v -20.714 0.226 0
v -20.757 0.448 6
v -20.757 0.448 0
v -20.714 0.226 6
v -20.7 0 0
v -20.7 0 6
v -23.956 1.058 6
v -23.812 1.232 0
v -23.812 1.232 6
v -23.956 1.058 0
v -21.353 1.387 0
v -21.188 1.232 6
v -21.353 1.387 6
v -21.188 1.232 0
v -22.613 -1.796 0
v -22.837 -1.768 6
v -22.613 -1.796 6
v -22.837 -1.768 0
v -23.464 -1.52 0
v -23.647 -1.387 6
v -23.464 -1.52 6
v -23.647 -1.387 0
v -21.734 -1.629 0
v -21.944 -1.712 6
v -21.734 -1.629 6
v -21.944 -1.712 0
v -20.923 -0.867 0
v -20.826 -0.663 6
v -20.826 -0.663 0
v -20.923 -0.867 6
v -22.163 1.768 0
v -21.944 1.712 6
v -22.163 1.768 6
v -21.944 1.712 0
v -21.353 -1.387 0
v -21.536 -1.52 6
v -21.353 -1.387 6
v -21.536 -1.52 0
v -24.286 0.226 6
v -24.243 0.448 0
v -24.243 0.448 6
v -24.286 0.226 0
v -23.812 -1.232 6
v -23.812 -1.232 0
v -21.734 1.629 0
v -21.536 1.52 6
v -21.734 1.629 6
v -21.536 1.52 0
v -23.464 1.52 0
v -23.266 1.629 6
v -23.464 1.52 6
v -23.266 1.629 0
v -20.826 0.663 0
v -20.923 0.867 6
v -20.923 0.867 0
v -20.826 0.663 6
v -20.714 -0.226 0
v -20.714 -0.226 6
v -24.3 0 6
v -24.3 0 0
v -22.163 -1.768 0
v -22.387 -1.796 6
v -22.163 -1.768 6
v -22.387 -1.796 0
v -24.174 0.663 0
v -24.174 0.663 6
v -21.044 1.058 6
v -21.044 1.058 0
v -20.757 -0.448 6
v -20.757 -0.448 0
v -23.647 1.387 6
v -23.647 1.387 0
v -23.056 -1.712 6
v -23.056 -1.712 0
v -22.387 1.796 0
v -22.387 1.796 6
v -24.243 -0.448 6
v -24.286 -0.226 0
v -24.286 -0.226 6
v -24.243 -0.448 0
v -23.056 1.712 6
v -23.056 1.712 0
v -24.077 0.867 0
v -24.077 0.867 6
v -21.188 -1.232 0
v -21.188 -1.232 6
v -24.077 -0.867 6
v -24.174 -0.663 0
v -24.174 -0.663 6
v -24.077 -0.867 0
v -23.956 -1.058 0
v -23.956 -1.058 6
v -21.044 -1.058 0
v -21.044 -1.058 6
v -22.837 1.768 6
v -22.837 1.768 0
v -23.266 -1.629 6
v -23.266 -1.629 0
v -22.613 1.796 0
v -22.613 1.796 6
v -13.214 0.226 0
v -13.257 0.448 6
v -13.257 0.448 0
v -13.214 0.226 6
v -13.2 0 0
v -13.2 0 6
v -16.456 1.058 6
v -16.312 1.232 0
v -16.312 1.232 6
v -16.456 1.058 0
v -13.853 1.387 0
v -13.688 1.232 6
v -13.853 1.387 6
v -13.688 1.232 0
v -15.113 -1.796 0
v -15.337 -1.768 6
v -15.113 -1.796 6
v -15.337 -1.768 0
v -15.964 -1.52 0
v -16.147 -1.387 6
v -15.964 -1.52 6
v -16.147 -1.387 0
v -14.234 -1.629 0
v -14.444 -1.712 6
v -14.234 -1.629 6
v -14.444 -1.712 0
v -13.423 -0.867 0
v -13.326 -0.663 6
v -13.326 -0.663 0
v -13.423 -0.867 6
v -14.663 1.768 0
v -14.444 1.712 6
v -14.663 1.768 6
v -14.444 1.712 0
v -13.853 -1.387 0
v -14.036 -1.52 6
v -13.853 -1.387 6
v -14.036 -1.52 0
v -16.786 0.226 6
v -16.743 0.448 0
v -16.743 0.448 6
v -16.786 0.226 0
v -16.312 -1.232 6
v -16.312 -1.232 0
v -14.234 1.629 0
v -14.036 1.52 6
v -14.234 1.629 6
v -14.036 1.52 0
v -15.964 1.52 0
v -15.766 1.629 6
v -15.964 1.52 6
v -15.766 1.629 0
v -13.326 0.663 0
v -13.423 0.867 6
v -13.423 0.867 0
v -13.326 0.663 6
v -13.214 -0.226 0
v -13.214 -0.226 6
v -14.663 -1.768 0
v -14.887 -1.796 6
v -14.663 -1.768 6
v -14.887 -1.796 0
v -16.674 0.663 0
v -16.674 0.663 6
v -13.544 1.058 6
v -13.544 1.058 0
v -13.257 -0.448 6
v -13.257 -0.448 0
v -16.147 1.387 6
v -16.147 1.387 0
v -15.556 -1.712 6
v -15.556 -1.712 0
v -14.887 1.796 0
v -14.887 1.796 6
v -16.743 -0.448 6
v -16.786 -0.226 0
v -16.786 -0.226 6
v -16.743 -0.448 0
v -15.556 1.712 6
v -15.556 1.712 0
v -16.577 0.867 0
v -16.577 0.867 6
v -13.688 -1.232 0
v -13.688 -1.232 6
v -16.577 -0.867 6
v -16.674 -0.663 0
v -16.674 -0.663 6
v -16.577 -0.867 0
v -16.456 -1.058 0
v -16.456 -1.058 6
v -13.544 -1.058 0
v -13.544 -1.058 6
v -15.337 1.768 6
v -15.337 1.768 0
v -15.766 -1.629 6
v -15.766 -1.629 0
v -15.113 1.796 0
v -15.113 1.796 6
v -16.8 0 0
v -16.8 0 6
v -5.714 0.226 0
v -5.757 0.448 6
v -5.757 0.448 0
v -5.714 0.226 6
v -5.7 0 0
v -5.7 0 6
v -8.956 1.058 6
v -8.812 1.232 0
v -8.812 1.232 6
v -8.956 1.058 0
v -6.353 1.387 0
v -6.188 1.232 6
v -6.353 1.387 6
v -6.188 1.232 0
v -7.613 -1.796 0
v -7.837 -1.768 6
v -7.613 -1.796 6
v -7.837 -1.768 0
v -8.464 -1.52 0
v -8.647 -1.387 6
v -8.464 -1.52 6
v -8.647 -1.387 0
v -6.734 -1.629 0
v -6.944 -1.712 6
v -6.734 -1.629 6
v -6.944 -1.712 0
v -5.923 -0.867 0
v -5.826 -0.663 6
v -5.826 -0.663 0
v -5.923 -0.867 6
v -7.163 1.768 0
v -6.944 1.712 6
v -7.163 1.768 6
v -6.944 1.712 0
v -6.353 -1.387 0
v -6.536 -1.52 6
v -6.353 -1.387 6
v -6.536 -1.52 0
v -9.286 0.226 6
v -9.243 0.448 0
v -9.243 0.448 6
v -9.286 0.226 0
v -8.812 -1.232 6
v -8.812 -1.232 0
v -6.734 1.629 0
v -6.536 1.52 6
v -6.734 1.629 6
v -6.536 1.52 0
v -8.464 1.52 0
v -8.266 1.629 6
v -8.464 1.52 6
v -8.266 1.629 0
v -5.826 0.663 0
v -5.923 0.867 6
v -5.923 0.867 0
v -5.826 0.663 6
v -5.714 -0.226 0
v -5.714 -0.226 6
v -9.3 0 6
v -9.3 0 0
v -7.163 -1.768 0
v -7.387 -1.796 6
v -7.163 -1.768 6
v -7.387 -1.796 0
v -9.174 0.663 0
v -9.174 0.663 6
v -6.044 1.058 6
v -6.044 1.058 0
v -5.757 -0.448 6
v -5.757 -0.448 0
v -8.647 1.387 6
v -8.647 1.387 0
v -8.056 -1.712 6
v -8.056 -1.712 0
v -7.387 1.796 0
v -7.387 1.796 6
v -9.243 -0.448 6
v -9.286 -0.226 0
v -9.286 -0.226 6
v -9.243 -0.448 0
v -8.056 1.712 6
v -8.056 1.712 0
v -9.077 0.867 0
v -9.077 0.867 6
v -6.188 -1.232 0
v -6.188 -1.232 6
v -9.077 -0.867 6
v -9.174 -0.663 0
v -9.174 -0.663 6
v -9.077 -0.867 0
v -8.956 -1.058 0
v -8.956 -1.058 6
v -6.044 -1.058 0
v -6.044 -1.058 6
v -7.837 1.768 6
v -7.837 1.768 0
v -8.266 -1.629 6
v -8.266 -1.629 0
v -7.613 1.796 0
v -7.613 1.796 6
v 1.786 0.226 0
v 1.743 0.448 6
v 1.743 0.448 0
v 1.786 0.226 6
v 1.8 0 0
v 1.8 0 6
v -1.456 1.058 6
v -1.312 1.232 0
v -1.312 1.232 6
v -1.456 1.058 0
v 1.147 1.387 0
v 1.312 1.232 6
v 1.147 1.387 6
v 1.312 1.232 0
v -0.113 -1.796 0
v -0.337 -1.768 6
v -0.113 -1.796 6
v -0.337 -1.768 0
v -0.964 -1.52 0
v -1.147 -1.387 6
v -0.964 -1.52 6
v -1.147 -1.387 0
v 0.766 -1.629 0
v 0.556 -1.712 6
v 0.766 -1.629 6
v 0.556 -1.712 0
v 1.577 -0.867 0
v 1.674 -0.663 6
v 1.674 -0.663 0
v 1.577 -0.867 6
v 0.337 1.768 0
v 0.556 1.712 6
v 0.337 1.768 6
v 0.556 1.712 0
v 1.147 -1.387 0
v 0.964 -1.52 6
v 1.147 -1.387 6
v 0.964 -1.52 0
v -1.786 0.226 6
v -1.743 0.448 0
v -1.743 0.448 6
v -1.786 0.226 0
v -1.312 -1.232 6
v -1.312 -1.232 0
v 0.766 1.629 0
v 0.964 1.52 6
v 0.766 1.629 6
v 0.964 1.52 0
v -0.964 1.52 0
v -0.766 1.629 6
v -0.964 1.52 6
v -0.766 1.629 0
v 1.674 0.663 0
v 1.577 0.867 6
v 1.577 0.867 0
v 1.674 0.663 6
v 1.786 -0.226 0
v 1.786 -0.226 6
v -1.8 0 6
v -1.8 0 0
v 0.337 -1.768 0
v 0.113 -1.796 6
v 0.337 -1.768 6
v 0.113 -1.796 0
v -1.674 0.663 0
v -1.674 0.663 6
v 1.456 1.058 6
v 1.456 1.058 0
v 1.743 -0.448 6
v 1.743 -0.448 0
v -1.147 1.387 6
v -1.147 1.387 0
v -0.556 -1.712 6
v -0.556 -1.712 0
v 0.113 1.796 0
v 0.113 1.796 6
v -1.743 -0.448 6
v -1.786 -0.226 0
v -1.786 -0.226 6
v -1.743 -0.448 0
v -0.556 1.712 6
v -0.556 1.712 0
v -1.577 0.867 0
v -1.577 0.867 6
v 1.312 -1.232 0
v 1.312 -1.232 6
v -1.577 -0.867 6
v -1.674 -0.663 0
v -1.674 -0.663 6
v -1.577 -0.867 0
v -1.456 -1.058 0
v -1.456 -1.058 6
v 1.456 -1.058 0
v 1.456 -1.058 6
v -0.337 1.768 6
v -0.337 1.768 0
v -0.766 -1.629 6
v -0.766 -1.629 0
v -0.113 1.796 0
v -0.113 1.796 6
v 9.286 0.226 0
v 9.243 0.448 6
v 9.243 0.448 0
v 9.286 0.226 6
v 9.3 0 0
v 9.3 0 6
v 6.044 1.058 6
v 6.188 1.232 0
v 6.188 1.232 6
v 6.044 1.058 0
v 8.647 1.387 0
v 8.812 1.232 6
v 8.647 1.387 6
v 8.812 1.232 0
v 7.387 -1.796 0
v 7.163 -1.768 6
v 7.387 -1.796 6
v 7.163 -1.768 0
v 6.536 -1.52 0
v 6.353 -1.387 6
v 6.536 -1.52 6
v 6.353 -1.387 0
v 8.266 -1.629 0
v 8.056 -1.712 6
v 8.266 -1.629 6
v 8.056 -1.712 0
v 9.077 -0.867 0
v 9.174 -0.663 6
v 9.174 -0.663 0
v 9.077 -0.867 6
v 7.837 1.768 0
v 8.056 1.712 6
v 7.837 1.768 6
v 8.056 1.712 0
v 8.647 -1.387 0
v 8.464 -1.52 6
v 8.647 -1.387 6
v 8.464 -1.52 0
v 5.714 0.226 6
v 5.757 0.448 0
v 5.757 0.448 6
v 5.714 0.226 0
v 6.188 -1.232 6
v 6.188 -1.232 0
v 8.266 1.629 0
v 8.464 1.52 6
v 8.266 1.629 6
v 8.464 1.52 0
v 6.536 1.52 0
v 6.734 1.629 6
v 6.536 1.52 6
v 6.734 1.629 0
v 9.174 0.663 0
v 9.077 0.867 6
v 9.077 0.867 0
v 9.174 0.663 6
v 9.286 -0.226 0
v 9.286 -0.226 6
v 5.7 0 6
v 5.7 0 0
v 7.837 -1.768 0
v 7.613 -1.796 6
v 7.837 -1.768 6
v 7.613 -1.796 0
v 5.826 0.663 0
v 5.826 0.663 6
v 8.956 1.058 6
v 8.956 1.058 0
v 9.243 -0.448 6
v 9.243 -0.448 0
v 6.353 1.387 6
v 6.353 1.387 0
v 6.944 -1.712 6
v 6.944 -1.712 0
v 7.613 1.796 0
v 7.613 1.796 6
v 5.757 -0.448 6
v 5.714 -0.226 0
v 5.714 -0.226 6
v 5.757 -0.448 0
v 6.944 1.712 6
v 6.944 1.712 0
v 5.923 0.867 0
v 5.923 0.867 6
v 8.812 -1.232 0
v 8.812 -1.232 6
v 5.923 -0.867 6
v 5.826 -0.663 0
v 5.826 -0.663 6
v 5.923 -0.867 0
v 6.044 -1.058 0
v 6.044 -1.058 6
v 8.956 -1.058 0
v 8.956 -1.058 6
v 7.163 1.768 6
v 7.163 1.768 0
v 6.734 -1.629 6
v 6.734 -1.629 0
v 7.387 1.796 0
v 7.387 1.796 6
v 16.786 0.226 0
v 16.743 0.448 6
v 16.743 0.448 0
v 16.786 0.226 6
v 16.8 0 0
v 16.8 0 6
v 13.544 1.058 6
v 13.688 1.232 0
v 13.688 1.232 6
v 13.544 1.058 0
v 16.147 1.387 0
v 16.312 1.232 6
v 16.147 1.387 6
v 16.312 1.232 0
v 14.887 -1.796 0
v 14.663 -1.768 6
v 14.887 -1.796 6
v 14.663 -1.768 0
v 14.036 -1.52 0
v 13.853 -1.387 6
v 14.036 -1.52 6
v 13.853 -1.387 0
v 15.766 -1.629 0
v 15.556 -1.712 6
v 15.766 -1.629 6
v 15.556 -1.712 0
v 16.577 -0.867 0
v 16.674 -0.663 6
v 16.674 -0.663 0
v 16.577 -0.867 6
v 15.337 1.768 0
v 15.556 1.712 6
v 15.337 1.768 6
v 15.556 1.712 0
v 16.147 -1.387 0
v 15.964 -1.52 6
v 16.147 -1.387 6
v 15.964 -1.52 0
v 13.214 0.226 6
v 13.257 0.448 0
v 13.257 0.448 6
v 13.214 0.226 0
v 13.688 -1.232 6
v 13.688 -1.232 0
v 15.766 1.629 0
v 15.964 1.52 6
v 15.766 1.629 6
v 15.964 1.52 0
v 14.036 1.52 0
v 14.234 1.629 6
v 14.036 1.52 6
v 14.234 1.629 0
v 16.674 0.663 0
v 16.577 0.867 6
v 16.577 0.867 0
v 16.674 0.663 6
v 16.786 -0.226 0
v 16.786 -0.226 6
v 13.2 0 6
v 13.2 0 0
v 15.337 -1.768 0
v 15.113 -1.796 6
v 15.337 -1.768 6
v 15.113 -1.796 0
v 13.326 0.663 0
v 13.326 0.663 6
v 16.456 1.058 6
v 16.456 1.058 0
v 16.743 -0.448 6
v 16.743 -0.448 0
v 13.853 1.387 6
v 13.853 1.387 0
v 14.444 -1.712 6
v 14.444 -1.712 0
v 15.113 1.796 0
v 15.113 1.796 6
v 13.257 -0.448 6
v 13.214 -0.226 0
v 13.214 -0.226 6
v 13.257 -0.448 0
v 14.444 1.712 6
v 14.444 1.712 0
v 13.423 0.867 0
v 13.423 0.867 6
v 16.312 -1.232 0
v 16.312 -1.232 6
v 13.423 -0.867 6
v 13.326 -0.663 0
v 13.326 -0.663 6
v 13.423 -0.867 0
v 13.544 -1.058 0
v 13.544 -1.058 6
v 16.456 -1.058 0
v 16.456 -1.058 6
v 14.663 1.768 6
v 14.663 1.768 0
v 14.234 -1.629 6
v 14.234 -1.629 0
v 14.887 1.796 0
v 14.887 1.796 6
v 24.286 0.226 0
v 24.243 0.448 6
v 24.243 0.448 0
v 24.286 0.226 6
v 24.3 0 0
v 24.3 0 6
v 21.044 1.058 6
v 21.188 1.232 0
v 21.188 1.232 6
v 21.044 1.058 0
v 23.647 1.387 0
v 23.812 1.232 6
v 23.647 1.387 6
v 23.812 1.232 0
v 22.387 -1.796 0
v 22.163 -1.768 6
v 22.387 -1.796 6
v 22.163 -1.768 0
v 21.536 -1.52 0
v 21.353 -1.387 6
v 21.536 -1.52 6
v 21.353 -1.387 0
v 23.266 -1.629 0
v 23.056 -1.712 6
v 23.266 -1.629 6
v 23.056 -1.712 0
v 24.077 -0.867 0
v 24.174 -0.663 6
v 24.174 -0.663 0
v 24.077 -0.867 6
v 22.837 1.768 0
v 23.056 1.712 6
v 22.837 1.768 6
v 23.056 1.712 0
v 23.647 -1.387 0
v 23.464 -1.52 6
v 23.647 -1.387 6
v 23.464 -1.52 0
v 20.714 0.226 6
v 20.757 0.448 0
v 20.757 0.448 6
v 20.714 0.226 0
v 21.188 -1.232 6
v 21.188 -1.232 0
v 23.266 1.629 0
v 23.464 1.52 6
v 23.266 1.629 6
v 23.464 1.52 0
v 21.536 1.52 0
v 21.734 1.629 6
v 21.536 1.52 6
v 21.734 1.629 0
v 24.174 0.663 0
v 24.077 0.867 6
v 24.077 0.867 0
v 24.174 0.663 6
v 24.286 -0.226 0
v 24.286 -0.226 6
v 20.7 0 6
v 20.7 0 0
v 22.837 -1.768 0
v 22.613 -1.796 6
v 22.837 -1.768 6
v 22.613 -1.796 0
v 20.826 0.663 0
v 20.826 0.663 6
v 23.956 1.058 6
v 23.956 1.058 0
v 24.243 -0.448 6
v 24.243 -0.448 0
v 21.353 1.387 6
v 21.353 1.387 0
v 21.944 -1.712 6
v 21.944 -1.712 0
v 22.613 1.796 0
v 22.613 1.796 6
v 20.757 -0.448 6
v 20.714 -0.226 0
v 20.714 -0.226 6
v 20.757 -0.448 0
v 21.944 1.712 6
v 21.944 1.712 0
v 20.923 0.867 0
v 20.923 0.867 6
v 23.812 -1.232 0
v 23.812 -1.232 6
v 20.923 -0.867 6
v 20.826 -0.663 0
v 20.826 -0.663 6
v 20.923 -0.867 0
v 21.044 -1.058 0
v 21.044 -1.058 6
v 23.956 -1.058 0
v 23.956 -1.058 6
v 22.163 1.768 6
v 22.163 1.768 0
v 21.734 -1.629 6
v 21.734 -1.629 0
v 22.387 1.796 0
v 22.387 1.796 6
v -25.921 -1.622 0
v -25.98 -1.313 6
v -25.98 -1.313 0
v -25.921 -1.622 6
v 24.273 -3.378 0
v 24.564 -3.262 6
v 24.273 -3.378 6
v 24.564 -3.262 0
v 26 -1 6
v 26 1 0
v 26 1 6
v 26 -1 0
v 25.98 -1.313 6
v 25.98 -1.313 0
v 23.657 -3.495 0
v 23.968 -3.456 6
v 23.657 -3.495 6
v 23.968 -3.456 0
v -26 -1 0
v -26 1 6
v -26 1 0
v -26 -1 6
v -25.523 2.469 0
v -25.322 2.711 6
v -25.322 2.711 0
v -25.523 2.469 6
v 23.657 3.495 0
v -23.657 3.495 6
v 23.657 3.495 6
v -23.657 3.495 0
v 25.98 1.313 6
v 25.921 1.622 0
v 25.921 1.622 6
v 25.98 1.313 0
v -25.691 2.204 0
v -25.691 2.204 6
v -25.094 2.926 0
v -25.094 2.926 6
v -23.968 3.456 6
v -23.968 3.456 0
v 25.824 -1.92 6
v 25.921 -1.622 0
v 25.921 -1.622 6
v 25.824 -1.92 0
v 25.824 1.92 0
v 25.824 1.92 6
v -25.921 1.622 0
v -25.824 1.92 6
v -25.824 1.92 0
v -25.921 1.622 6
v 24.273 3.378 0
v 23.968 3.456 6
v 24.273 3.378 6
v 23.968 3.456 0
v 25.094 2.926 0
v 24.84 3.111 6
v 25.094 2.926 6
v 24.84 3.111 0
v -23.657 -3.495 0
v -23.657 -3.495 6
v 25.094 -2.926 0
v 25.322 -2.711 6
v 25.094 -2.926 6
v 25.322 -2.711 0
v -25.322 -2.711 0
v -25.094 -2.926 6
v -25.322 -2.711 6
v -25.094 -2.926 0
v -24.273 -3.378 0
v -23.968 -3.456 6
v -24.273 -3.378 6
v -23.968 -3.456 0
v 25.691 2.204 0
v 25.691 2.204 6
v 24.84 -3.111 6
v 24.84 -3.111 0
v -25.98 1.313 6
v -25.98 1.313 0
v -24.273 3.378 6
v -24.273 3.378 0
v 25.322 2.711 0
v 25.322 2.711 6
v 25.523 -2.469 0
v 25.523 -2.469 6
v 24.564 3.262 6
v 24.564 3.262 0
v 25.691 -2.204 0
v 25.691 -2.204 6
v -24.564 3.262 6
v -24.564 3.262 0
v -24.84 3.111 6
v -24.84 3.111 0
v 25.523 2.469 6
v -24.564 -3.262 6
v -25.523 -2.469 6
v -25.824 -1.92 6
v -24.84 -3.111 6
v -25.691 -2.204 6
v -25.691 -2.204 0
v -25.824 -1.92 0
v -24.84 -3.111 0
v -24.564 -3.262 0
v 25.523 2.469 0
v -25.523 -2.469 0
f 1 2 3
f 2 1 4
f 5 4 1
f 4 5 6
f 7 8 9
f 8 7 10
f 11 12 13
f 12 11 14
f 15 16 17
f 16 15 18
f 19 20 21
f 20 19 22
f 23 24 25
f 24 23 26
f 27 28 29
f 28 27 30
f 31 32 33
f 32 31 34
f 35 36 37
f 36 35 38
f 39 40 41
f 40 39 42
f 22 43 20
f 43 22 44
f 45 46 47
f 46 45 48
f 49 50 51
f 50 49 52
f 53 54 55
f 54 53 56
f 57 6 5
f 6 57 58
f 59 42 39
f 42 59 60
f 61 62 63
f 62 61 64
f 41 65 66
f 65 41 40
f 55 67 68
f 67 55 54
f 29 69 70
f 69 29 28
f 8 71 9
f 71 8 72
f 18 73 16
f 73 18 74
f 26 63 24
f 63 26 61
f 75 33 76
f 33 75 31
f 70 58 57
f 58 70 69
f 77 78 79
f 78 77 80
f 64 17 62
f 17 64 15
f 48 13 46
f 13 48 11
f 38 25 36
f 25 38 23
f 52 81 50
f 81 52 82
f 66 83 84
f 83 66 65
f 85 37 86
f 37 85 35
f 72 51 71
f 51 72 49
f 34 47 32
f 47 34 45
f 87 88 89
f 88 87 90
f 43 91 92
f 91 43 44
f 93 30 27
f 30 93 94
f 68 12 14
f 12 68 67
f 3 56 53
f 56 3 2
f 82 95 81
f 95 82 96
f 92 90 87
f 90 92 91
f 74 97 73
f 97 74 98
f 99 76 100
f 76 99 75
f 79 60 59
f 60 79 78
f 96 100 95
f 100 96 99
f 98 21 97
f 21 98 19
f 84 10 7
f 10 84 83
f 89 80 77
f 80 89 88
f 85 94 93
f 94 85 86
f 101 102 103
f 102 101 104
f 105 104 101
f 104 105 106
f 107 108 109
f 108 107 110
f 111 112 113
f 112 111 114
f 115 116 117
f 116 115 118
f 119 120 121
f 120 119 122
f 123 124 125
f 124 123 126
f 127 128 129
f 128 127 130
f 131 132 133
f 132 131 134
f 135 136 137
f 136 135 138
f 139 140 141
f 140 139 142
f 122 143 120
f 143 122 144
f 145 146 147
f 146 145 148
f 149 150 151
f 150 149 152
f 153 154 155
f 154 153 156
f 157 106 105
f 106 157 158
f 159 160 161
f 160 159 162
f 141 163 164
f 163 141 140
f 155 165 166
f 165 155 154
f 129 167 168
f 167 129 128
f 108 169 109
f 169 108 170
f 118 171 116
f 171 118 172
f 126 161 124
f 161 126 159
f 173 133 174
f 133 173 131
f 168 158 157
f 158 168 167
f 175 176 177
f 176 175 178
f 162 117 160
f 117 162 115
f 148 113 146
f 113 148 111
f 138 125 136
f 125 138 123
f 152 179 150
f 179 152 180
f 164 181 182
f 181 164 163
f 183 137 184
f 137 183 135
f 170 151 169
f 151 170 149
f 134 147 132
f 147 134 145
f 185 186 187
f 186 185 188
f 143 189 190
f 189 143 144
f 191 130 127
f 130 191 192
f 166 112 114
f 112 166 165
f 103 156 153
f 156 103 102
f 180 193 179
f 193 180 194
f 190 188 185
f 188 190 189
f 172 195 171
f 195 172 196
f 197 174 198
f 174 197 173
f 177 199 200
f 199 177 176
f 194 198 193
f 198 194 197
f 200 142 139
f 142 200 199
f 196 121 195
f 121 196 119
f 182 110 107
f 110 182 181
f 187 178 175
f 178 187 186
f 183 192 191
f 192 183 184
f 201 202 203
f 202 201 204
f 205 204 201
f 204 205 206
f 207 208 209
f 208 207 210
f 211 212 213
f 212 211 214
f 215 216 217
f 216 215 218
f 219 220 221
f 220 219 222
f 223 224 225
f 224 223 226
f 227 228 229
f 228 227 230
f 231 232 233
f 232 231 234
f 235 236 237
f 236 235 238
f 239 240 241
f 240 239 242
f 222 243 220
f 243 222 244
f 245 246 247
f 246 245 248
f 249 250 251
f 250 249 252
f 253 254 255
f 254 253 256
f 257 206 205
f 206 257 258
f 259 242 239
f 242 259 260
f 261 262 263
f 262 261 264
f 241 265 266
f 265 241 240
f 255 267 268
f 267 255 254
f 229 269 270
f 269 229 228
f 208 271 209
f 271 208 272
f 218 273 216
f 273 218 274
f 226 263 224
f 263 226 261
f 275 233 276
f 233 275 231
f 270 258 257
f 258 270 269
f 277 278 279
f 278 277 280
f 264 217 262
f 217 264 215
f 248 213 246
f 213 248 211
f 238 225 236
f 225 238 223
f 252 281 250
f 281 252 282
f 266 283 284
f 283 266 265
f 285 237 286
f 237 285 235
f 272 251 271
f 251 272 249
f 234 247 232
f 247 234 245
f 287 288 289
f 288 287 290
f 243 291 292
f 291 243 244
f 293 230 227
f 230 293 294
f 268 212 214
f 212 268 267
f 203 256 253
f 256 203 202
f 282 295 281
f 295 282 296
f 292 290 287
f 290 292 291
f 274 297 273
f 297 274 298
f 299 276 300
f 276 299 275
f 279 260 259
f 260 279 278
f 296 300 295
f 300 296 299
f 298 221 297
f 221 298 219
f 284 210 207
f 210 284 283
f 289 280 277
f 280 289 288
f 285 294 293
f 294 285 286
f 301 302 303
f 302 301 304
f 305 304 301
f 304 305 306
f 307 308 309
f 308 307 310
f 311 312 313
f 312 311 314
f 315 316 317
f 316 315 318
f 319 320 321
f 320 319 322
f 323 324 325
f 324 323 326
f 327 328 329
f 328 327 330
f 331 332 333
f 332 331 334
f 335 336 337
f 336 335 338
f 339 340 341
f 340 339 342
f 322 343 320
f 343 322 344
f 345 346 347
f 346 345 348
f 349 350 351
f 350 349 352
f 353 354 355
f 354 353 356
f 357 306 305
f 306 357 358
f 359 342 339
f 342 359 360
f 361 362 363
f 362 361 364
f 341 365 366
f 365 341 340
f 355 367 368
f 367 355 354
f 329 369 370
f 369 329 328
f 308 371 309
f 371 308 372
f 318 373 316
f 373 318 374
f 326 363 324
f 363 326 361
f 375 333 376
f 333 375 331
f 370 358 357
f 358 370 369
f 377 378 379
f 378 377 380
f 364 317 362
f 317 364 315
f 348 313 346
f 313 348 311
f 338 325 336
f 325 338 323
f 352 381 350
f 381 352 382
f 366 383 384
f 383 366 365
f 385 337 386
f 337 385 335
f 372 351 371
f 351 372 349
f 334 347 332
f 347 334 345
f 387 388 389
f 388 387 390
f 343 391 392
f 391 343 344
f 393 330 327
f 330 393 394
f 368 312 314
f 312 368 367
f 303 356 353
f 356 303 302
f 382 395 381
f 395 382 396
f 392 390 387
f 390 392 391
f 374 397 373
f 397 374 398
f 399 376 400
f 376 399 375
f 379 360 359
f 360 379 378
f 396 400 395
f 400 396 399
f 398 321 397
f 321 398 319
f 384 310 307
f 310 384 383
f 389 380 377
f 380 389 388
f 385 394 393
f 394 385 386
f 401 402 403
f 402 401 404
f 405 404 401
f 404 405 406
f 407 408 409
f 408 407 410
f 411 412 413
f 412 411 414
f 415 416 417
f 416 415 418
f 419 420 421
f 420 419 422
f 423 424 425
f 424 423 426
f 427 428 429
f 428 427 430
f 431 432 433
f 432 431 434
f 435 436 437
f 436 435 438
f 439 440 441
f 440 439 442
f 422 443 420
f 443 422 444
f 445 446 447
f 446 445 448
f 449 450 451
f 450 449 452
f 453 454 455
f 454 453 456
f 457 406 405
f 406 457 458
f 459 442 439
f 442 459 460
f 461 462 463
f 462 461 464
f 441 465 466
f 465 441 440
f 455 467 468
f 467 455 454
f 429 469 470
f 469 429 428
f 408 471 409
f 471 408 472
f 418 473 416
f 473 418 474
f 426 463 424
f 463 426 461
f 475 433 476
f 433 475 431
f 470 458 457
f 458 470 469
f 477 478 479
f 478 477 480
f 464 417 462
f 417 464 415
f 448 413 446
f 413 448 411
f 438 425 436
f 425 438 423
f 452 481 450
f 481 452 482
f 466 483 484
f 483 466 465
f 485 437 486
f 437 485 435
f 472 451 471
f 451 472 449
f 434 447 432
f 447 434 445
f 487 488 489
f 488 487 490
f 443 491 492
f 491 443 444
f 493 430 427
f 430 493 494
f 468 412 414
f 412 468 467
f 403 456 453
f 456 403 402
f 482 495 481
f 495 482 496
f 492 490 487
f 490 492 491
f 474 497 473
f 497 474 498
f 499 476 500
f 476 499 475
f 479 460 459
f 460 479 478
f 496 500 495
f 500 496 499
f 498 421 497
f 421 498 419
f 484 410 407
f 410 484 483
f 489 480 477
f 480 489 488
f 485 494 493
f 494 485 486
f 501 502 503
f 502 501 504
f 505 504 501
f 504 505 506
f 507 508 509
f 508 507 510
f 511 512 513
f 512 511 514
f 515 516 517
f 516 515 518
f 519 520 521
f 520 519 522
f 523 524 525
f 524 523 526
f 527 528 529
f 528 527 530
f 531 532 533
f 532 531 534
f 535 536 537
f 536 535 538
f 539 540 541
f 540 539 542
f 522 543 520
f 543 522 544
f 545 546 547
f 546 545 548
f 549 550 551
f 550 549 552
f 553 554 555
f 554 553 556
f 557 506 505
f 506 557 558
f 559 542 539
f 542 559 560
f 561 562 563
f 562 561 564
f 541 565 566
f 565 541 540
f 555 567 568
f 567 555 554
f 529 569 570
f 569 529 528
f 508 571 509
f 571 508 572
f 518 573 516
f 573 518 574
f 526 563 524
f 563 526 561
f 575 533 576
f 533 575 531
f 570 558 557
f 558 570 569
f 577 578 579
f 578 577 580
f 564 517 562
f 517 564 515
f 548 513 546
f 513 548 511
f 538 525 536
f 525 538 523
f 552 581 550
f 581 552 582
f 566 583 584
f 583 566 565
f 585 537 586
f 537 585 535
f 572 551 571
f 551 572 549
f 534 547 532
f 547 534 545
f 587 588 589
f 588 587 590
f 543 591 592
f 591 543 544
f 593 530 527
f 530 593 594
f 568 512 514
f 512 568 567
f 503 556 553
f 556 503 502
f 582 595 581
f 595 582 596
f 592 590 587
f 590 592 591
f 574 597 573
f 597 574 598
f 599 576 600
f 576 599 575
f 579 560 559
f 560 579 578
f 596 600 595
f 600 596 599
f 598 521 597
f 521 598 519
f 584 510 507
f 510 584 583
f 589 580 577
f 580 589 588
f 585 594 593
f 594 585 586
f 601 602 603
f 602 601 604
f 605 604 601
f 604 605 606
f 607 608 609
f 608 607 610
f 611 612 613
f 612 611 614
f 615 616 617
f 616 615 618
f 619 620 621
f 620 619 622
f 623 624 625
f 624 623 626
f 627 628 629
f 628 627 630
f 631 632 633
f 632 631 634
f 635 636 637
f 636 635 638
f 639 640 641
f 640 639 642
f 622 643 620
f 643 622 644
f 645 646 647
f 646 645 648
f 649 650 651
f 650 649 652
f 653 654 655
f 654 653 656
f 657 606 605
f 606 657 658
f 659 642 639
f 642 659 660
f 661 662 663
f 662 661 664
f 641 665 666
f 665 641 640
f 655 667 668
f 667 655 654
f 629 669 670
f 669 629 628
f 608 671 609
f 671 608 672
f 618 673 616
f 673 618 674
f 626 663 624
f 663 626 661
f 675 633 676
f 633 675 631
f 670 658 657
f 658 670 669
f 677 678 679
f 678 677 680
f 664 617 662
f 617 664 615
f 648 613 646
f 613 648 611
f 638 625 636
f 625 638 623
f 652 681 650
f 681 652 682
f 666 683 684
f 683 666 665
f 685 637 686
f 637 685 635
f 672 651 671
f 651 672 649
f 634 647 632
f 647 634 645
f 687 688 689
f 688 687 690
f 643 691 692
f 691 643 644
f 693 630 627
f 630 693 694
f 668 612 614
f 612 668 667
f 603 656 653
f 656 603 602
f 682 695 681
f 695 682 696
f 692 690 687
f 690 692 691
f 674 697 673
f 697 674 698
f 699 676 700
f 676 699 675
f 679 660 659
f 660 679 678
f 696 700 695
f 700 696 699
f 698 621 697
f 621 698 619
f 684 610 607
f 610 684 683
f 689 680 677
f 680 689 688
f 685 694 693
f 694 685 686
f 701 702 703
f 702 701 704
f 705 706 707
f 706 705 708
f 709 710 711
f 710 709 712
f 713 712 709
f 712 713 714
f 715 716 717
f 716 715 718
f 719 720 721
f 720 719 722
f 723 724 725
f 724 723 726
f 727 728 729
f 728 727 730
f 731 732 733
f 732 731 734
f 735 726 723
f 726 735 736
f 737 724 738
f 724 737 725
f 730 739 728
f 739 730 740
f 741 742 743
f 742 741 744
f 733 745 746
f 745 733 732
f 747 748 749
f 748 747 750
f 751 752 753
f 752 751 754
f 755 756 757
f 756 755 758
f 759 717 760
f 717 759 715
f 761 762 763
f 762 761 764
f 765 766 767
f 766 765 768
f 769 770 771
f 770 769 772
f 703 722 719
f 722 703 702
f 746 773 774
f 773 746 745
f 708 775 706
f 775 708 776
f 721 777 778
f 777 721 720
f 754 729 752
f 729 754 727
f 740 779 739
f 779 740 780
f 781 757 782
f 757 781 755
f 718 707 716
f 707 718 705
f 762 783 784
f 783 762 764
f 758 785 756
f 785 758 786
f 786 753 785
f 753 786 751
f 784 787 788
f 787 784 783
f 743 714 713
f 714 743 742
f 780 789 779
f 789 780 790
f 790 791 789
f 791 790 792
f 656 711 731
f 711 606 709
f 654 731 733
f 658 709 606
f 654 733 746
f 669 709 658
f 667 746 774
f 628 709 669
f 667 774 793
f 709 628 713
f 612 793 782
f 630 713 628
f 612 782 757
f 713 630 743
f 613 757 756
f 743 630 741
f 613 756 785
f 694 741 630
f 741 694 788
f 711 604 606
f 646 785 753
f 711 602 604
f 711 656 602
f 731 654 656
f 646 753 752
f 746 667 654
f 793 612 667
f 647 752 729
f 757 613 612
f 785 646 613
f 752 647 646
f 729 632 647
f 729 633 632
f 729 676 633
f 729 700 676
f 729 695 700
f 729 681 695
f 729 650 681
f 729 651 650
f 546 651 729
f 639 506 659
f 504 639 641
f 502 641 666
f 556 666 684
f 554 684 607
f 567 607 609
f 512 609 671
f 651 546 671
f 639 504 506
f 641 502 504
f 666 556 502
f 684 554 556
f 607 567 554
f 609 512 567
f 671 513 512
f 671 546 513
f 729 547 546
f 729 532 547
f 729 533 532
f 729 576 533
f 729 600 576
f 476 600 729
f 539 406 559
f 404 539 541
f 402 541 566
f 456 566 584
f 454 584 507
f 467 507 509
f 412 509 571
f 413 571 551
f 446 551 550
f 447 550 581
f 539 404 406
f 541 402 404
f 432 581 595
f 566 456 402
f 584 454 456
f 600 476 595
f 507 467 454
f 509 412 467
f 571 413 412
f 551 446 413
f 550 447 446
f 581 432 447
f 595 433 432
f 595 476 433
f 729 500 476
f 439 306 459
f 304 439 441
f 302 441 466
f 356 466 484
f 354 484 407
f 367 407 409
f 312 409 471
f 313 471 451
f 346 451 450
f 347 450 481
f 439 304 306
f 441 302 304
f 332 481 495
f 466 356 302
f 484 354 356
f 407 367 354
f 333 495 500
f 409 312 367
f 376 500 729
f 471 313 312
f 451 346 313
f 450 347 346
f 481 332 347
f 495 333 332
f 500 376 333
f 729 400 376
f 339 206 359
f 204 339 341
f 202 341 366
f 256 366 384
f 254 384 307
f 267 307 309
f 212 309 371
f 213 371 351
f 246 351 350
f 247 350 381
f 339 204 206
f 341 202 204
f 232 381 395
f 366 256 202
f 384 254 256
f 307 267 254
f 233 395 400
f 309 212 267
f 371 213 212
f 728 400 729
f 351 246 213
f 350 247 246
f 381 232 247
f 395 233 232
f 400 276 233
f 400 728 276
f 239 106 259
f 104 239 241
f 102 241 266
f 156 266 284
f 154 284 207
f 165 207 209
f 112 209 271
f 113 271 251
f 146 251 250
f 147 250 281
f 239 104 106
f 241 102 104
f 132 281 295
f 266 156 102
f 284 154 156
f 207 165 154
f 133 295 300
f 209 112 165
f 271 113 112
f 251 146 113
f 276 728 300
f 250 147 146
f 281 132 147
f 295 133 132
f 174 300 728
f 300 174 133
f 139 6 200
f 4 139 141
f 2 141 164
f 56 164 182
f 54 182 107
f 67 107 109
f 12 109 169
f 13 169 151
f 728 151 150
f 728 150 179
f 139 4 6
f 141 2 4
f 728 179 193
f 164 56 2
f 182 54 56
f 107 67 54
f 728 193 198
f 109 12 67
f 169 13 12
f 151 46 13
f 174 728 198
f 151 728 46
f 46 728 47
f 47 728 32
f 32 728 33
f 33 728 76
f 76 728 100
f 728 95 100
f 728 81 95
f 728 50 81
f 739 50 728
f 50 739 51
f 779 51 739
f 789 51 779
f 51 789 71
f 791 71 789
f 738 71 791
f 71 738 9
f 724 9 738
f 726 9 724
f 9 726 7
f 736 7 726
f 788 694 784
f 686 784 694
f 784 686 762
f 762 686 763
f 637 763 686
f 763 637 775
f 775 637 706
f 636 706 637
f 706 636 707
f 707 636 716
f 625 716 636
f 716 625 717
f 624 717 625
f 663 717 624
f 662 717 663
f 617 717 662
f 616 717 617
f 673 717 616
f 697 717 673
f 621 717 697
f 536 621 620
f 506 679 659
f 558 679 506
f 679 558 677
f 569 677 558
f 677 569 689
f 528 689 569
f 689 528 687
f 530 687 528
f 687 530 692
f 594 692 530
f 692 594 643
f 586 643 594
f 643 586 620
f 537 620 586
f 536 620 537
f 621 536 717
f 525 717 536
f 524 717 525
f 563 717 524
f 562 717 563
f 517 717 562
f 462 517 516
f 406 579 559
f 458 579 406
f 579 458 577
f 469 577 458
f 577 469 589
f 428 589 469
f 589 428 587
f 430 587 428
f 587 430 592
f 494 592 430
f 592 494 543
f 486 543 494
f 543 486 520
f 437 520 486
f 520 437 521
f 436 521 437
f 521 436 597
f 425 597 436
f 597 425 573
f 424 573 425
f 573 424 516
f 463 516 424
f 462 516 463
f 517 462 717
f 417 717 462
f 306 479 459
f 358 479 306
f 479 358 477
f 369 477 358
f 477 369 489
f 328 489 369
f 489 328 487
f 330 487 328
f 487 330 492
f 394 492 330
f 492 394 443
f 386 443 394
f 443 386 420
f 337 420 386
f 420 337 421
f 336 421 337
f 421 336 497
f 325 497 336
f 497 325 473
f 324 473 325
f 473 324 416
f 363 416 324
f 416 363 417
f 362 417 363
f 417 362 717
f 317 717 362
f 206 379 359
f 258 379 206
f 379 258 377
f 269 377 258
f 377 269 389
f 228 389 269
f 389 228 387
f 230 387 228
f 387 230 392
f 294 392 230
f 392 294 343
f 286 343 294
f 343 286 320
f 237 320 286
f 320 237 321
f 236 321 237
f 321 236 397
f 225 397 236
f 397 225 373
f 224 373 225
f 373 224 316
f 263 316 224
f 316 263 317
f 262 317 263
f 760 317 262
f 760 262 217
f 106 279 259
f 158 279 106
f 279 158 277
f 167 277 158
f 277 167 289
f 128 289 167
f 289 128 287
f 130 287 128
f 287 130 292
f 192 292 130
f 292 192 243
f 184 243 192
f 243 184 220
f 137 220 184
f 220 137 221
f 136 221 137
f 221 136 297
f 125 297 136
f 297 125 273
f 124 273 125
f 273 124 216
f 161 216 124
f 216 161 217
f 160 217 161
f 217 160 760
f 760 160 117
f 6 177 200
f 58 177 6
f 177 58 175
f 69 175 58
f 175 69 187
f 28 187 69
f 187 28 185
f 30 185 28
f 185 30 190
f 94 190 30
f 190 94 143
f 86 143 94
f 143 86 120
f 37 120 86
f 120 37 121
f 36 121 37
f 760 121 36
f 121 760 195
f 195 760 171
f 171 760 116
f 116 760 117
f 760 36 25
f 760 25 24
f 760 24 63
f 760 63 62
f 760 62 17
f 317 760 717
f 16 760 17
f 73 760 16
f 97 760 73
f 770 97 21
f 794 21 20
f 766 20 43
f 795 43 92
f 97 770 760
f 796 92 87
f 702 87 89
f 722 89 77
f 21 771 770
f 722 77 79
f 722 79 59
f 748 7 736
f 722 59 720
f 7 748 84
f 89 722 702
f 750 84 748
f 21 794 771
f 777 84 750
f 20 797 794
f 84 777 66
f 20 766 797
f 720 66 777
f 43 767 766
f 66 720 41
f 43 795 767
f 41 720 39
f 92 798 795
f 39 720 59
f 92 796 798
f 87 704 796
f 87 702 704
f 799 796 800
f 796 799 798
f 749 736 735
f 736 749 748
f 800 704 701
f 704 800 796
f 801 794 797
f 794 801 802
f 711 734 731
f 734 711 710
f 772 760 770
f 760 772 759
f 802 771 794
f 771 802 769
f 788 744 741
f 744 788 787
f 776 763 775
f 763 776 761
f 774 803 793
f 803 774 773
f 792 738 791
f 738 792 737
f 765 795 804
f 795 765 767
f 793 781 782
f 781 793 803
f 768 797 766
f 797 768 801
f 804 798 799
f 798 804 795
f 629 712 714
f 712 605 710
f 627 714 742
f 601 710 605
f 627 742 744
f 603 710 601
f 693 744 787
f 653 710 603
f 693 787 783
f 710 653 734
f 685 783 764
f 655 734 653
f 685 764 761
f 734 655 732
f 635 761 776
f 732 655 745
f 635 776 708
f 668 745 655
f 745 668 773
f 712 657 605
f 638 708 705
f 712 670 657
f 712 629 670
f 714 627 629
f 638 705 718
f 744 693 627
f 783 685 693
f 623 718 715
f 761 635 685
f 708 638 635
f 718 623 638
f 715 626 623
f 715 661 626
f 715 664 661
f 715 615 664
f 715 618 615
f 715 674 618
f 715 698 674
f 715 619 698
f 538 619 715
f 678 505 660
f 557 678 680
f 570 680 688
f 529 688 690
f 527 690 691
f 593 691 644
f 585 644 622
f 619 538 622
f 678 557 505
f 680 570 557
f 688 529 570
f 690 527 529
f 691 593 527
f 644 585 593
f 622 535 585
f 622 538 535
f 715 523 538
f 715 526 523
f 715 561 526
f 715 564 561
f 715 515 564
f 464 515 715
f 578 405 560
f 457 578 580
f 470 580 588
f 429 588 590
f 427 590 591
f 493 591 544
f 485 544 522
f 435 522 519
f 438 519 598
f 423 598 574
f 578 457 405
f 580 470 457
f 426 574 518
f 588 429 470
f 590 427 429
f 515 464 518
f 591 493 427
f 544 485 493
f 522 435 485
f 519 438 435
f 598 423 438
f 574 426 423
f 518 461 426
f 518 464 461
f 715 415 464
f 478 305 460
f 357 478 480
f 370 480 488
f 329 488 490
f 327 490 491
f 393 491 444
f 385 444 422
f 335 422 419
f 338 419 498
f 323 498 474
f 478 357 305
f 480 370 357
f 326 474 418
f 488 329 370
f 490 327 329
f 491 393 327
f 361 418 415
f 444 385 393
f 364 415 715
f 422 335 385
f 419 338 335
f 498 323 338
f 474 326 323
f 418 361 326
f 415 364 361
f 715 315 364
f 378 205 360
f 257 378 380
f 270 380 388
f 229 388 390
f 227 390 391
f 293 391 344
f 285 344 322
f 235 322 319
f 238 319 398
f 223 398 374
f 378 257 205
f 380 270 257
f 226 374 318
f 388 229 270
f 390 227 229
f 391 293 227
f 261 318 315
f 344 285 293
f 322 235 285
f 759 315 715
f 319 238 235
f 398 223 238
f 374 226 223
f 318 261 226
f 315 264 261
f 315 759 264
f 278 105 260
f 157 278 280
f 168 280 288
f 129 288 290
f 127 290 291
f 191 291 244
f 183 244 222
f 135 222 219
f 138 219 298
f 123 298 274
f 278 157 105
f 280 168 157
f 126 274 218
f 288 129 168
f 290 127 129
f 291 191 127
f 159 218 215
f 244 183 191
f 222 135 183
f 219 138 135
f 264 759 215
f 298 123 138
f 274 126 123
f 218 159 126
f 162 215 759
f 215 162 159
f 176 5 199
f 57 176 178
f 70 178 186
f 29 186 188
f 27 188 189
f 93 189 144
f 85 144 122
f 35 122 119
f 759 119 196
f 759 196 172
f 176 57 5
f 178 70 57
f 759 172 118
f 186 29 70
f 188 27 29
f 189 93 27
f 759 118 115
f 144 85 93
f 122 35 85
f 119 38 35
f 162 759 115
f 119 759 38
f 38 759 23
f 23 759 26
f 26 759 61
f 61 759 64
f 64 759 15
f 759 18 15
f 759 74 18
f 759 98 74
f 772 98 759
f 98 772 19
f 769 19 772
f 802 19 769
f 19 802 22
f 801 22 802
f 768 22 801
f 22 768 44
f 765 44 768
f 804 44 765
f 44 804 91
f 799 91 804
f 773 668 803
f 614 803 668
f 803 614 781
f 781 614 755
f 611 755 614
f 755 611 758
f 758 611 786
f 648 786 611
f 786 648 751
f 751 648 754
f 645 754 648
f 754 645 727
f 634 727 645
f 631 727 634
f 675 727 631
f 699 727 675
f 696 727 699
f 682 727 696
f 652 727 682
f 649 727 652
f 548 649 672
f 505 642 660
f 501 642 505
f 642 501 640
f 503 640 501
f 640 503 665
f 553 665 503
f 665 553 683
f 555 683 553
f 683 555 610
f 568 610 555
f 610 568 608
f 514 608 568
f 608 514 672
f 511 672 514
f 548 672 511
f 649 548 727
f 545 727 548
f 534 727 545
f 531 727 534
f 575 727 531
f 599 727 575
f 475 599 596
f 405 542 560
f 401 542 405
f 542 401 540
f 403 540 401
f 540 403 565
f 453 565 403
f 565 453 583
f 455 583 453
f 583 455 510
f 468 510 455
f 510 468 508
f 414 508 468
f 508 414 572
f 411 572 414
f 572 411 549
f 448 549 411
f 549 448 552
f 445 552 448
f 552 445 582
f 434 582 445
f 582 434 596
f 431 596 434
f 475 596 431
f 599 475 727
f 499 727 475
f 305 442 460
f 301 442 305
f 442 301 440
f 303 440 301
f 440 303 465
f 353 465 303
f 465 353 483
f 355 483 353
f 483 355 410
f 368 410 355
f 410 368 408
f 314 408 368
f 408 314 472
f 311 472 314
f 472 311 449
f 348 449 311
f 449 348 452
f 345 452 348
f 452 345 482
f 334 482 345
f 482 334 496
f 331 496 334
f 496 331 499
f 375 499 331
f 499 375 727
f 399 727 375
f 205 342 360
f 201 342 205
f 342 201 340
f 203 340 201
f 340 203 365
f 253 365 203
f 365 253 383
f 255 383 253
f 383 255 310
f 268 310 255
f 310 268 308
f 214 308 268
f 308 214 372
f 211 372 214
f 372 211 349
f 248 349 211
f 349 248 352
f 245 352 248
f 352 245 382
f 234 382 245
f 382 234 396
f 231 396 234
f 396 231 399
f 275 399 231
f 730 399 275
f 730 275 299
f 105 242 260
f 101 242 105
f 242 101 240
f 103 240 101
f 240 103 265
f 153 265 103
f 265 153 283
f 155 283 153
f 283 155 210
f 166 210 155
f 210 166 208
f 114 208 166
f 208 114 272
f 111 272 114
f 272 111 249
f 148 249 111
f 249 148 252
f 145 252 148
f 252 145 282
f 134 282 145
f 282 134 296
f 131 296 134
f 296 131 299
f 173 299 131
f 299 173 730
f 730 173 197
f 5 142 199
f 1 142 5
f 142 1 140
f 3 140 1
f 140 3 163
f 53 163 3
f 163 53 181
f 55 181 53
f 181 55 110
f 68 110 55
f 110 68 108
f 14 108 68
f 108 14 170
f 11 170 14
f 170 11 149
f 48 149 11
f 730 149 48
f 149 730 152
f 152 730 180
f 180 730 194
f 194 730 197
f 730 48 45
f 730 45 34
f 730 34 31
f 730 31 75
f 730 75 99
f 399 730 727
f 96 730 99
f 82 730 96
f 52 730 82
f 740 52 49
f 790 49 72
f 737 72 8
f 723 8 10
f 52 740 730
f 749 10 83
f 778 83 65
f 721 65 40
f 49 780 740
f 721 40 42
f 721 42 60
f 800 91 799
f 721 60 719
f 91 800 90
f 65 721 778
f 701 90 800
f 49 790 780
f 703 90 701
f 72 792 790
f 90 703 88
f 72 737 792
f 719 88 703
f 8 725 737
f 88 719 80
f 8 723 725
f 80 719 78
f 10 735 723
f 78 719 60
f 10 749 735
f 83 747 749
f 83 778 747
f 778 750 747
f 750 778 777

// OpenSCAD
$fn = 50;


difference() {
	union() {
		translate(v = [0, 0, 0]) {
			rotate(a = [0, 0, 0]) {
				hull() {
					translate(v = [-23.5000000000, 1.0000000000, 0]) {
						rotate(a = [0, 0, 0]) {
							translate(v = [0, 0, 0]) {
								rotate(a = [0, 0, 0]) {
									cylinder(h = 6, r = 2.5000000000);
								}
							}
						}
					}
					translate(v = [23.5000000000, 1.0000000000, 0]) {
						rotate(a = [0, 0, 0]) {
							translate(v = [0, 0, 0]) {
								rotate(a = [0, 0, 0]) {
									cylinder(h = 6, r = 2.5000000000);
								}
							}
						}
					}
					translate(v = [-23.5000000000, -1.0000000000, 0]) {
						rotate(a = [0, 0, 0]) {
							translate(v = [0, 0, 0]) {
								rotate(a = [0, 0, 0]) {
									cylinder(h = 6, r = 2.5000000000);
								}
							}
						}
					}
					translate(v = [23.5000000000, -1.0000000000, 0]) {
						rotate(a = [0, 0, 0]) {
							translate(v = [0, 0, 0]) {
								rotate(a = [0, 0, 0]) {
									cylinder(h = 6, r = 2.5000000000);
								}
							}
						}
					}
				}
			}
		}
	}
	union() {
		translate(v = [-22.5000000000, 0.0000000000, 0]) {
			rotate(a = [0, 0, 0]) {
				translate(v = [0, 0, -50]) {
					rotate(a = [0, 0, 0]) {
						cylinder(h = 100, r = 1.8000000000);
					}
				}
			}
		}
		translate(v = [-15.0000000000, 0.0000000000, 0]) {
			rotate(a = [0, 0, 0]) {
				translate(v = [0, 0, -50]) {
					rotate(a = [0, 0, 0]) {
						cylinder(h = 100, r = 1.8000000000);
					}
				}
			}
		}
		translate(v = [-7.5000000000, 0.0000000000, 0]) {
			rotate(a = [0, 0, 0]) {
				translate(v = [0, 0, -50]) {
					rotate(a = [0, 0, 0]) {
						cylinder(h = 100, r = 1.8000000000);
					}
				}
			}
		}
		translate(v = [0.0000000000, 0.0000000000, 0]) {
			rotate(a = [0, 0, 0]) {
				translate(v = [0, 0, -50]) {
					rotate(a = [0, 0, 0]) {
						cylinder(h = 100, r = 1.8000000000);
					}
				}
			}
		}
		translate(v = [7.5000000000, 0.0000000000, 0]) {
			rotate(a = [0, 0, 0]) {
				translate(v = [0, 0, -50]) {
					rotate(a = [0, 0, 0]) {
						cylinder(h = 100, r = 1.8000000000);
					}
				}
			}
		}
		translate(v = [15.0000000000, 0.0000000000, 0]) {
			rotate(a = [0, 0, 0]) {
				translate(v = [0, 0, -50]) {
					rotate(a = [0, 0, 0]) {
						cylinder(h = 100, r = 1.8000000000);
					}
				}
			}
		}
		translate(v = [22.5000000000, 0.0000000000, 0]) {
			rotate(a = [0, 0, 0]) {
				translate(v = [0, 0, -50]) {
					rotate(a = [0, 0, 0]) {
						cylinder(h = 100, r = 1.8000000000);
					}
				}
			}
		}
	}
}
